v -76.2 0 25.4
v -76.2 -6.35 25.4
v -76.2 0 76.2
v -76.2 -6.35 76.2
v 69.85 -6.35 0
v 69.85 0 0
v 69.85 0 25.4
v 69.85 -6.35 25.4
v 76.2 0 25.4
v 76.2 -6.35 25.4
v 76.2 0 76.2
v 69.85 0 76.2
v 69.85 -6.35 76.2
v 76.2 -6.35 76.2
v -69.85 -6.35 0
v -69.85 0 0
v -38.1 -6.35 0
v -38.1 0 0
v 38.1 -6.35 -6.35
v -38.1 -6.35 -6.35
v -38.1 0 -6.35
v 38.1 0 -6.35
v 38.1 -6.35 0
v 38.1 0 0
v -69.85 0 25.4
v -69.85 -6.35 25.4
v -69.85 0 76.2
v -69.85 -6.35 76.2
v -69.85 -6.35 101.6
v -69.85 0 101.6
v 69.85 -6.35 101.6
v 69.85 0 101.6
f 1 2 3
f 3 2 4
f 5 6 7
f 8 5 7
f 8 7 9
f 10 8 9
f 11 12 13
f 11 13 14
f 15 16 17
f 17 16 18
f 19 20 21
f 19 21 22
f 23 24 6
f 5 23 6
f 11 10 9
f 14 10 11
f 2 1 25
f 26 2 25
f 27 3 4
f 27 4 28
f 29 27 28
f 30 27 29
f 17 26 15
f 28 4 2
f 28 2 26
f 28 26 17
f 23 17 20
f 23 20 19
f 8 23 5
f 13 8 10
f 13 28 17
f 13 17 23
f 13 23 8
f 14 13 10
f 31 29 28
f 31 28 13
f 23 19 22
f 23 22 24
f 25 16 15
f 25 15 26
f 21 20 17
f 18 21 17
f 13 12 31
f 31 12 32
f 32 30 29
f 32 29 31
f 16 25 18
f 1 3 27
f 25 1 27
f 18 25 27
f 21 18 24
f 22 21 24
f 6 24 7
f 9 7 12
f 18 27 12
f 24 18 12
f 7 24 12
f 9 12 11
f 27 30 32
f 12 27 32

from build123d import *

# Parameters (mm, degrees)
F0_W     = 139.7
F0_H     = 101.6
F1_DEPTH = 6.35
F2_W     = 76.2
F2_H     = 6.35
F3_DEPTH = 6.35
F4_W     = 6.35
F4_H     = 50.8
F5_DEPTH = 6.35


with BuildPart() as f1:
    # F0 (on Front) → F1 (new body)
    with BuildSketch(Plane.XZ):
        with Locations((0, 50.8)):
            Rectangle(F0_W, F0_H)
    extrude(amount=F1_DEPTH)

    # F2 (on face) → F3 (join)
    with BuildSketch(Plane.XZ.offset(6.35)):
        with Locations((0, -3.175)):
            Rectangle(F2_W, F2_H)
    extrude(amount=-F3_DEPTH)

    # F4 (on face) → F5 (join)
    with BuildSketch(Plane.XZ.offset(6.35)):
        with Locations((-73.025, 50.8)):
            Rectangle(F4_W, F4_H)
        with Locations((73.025, 50.8)):
            Rectangle(F4_W, F4_H)
    extrude(amount=-F5_DEPTH)


solid = f1.part
